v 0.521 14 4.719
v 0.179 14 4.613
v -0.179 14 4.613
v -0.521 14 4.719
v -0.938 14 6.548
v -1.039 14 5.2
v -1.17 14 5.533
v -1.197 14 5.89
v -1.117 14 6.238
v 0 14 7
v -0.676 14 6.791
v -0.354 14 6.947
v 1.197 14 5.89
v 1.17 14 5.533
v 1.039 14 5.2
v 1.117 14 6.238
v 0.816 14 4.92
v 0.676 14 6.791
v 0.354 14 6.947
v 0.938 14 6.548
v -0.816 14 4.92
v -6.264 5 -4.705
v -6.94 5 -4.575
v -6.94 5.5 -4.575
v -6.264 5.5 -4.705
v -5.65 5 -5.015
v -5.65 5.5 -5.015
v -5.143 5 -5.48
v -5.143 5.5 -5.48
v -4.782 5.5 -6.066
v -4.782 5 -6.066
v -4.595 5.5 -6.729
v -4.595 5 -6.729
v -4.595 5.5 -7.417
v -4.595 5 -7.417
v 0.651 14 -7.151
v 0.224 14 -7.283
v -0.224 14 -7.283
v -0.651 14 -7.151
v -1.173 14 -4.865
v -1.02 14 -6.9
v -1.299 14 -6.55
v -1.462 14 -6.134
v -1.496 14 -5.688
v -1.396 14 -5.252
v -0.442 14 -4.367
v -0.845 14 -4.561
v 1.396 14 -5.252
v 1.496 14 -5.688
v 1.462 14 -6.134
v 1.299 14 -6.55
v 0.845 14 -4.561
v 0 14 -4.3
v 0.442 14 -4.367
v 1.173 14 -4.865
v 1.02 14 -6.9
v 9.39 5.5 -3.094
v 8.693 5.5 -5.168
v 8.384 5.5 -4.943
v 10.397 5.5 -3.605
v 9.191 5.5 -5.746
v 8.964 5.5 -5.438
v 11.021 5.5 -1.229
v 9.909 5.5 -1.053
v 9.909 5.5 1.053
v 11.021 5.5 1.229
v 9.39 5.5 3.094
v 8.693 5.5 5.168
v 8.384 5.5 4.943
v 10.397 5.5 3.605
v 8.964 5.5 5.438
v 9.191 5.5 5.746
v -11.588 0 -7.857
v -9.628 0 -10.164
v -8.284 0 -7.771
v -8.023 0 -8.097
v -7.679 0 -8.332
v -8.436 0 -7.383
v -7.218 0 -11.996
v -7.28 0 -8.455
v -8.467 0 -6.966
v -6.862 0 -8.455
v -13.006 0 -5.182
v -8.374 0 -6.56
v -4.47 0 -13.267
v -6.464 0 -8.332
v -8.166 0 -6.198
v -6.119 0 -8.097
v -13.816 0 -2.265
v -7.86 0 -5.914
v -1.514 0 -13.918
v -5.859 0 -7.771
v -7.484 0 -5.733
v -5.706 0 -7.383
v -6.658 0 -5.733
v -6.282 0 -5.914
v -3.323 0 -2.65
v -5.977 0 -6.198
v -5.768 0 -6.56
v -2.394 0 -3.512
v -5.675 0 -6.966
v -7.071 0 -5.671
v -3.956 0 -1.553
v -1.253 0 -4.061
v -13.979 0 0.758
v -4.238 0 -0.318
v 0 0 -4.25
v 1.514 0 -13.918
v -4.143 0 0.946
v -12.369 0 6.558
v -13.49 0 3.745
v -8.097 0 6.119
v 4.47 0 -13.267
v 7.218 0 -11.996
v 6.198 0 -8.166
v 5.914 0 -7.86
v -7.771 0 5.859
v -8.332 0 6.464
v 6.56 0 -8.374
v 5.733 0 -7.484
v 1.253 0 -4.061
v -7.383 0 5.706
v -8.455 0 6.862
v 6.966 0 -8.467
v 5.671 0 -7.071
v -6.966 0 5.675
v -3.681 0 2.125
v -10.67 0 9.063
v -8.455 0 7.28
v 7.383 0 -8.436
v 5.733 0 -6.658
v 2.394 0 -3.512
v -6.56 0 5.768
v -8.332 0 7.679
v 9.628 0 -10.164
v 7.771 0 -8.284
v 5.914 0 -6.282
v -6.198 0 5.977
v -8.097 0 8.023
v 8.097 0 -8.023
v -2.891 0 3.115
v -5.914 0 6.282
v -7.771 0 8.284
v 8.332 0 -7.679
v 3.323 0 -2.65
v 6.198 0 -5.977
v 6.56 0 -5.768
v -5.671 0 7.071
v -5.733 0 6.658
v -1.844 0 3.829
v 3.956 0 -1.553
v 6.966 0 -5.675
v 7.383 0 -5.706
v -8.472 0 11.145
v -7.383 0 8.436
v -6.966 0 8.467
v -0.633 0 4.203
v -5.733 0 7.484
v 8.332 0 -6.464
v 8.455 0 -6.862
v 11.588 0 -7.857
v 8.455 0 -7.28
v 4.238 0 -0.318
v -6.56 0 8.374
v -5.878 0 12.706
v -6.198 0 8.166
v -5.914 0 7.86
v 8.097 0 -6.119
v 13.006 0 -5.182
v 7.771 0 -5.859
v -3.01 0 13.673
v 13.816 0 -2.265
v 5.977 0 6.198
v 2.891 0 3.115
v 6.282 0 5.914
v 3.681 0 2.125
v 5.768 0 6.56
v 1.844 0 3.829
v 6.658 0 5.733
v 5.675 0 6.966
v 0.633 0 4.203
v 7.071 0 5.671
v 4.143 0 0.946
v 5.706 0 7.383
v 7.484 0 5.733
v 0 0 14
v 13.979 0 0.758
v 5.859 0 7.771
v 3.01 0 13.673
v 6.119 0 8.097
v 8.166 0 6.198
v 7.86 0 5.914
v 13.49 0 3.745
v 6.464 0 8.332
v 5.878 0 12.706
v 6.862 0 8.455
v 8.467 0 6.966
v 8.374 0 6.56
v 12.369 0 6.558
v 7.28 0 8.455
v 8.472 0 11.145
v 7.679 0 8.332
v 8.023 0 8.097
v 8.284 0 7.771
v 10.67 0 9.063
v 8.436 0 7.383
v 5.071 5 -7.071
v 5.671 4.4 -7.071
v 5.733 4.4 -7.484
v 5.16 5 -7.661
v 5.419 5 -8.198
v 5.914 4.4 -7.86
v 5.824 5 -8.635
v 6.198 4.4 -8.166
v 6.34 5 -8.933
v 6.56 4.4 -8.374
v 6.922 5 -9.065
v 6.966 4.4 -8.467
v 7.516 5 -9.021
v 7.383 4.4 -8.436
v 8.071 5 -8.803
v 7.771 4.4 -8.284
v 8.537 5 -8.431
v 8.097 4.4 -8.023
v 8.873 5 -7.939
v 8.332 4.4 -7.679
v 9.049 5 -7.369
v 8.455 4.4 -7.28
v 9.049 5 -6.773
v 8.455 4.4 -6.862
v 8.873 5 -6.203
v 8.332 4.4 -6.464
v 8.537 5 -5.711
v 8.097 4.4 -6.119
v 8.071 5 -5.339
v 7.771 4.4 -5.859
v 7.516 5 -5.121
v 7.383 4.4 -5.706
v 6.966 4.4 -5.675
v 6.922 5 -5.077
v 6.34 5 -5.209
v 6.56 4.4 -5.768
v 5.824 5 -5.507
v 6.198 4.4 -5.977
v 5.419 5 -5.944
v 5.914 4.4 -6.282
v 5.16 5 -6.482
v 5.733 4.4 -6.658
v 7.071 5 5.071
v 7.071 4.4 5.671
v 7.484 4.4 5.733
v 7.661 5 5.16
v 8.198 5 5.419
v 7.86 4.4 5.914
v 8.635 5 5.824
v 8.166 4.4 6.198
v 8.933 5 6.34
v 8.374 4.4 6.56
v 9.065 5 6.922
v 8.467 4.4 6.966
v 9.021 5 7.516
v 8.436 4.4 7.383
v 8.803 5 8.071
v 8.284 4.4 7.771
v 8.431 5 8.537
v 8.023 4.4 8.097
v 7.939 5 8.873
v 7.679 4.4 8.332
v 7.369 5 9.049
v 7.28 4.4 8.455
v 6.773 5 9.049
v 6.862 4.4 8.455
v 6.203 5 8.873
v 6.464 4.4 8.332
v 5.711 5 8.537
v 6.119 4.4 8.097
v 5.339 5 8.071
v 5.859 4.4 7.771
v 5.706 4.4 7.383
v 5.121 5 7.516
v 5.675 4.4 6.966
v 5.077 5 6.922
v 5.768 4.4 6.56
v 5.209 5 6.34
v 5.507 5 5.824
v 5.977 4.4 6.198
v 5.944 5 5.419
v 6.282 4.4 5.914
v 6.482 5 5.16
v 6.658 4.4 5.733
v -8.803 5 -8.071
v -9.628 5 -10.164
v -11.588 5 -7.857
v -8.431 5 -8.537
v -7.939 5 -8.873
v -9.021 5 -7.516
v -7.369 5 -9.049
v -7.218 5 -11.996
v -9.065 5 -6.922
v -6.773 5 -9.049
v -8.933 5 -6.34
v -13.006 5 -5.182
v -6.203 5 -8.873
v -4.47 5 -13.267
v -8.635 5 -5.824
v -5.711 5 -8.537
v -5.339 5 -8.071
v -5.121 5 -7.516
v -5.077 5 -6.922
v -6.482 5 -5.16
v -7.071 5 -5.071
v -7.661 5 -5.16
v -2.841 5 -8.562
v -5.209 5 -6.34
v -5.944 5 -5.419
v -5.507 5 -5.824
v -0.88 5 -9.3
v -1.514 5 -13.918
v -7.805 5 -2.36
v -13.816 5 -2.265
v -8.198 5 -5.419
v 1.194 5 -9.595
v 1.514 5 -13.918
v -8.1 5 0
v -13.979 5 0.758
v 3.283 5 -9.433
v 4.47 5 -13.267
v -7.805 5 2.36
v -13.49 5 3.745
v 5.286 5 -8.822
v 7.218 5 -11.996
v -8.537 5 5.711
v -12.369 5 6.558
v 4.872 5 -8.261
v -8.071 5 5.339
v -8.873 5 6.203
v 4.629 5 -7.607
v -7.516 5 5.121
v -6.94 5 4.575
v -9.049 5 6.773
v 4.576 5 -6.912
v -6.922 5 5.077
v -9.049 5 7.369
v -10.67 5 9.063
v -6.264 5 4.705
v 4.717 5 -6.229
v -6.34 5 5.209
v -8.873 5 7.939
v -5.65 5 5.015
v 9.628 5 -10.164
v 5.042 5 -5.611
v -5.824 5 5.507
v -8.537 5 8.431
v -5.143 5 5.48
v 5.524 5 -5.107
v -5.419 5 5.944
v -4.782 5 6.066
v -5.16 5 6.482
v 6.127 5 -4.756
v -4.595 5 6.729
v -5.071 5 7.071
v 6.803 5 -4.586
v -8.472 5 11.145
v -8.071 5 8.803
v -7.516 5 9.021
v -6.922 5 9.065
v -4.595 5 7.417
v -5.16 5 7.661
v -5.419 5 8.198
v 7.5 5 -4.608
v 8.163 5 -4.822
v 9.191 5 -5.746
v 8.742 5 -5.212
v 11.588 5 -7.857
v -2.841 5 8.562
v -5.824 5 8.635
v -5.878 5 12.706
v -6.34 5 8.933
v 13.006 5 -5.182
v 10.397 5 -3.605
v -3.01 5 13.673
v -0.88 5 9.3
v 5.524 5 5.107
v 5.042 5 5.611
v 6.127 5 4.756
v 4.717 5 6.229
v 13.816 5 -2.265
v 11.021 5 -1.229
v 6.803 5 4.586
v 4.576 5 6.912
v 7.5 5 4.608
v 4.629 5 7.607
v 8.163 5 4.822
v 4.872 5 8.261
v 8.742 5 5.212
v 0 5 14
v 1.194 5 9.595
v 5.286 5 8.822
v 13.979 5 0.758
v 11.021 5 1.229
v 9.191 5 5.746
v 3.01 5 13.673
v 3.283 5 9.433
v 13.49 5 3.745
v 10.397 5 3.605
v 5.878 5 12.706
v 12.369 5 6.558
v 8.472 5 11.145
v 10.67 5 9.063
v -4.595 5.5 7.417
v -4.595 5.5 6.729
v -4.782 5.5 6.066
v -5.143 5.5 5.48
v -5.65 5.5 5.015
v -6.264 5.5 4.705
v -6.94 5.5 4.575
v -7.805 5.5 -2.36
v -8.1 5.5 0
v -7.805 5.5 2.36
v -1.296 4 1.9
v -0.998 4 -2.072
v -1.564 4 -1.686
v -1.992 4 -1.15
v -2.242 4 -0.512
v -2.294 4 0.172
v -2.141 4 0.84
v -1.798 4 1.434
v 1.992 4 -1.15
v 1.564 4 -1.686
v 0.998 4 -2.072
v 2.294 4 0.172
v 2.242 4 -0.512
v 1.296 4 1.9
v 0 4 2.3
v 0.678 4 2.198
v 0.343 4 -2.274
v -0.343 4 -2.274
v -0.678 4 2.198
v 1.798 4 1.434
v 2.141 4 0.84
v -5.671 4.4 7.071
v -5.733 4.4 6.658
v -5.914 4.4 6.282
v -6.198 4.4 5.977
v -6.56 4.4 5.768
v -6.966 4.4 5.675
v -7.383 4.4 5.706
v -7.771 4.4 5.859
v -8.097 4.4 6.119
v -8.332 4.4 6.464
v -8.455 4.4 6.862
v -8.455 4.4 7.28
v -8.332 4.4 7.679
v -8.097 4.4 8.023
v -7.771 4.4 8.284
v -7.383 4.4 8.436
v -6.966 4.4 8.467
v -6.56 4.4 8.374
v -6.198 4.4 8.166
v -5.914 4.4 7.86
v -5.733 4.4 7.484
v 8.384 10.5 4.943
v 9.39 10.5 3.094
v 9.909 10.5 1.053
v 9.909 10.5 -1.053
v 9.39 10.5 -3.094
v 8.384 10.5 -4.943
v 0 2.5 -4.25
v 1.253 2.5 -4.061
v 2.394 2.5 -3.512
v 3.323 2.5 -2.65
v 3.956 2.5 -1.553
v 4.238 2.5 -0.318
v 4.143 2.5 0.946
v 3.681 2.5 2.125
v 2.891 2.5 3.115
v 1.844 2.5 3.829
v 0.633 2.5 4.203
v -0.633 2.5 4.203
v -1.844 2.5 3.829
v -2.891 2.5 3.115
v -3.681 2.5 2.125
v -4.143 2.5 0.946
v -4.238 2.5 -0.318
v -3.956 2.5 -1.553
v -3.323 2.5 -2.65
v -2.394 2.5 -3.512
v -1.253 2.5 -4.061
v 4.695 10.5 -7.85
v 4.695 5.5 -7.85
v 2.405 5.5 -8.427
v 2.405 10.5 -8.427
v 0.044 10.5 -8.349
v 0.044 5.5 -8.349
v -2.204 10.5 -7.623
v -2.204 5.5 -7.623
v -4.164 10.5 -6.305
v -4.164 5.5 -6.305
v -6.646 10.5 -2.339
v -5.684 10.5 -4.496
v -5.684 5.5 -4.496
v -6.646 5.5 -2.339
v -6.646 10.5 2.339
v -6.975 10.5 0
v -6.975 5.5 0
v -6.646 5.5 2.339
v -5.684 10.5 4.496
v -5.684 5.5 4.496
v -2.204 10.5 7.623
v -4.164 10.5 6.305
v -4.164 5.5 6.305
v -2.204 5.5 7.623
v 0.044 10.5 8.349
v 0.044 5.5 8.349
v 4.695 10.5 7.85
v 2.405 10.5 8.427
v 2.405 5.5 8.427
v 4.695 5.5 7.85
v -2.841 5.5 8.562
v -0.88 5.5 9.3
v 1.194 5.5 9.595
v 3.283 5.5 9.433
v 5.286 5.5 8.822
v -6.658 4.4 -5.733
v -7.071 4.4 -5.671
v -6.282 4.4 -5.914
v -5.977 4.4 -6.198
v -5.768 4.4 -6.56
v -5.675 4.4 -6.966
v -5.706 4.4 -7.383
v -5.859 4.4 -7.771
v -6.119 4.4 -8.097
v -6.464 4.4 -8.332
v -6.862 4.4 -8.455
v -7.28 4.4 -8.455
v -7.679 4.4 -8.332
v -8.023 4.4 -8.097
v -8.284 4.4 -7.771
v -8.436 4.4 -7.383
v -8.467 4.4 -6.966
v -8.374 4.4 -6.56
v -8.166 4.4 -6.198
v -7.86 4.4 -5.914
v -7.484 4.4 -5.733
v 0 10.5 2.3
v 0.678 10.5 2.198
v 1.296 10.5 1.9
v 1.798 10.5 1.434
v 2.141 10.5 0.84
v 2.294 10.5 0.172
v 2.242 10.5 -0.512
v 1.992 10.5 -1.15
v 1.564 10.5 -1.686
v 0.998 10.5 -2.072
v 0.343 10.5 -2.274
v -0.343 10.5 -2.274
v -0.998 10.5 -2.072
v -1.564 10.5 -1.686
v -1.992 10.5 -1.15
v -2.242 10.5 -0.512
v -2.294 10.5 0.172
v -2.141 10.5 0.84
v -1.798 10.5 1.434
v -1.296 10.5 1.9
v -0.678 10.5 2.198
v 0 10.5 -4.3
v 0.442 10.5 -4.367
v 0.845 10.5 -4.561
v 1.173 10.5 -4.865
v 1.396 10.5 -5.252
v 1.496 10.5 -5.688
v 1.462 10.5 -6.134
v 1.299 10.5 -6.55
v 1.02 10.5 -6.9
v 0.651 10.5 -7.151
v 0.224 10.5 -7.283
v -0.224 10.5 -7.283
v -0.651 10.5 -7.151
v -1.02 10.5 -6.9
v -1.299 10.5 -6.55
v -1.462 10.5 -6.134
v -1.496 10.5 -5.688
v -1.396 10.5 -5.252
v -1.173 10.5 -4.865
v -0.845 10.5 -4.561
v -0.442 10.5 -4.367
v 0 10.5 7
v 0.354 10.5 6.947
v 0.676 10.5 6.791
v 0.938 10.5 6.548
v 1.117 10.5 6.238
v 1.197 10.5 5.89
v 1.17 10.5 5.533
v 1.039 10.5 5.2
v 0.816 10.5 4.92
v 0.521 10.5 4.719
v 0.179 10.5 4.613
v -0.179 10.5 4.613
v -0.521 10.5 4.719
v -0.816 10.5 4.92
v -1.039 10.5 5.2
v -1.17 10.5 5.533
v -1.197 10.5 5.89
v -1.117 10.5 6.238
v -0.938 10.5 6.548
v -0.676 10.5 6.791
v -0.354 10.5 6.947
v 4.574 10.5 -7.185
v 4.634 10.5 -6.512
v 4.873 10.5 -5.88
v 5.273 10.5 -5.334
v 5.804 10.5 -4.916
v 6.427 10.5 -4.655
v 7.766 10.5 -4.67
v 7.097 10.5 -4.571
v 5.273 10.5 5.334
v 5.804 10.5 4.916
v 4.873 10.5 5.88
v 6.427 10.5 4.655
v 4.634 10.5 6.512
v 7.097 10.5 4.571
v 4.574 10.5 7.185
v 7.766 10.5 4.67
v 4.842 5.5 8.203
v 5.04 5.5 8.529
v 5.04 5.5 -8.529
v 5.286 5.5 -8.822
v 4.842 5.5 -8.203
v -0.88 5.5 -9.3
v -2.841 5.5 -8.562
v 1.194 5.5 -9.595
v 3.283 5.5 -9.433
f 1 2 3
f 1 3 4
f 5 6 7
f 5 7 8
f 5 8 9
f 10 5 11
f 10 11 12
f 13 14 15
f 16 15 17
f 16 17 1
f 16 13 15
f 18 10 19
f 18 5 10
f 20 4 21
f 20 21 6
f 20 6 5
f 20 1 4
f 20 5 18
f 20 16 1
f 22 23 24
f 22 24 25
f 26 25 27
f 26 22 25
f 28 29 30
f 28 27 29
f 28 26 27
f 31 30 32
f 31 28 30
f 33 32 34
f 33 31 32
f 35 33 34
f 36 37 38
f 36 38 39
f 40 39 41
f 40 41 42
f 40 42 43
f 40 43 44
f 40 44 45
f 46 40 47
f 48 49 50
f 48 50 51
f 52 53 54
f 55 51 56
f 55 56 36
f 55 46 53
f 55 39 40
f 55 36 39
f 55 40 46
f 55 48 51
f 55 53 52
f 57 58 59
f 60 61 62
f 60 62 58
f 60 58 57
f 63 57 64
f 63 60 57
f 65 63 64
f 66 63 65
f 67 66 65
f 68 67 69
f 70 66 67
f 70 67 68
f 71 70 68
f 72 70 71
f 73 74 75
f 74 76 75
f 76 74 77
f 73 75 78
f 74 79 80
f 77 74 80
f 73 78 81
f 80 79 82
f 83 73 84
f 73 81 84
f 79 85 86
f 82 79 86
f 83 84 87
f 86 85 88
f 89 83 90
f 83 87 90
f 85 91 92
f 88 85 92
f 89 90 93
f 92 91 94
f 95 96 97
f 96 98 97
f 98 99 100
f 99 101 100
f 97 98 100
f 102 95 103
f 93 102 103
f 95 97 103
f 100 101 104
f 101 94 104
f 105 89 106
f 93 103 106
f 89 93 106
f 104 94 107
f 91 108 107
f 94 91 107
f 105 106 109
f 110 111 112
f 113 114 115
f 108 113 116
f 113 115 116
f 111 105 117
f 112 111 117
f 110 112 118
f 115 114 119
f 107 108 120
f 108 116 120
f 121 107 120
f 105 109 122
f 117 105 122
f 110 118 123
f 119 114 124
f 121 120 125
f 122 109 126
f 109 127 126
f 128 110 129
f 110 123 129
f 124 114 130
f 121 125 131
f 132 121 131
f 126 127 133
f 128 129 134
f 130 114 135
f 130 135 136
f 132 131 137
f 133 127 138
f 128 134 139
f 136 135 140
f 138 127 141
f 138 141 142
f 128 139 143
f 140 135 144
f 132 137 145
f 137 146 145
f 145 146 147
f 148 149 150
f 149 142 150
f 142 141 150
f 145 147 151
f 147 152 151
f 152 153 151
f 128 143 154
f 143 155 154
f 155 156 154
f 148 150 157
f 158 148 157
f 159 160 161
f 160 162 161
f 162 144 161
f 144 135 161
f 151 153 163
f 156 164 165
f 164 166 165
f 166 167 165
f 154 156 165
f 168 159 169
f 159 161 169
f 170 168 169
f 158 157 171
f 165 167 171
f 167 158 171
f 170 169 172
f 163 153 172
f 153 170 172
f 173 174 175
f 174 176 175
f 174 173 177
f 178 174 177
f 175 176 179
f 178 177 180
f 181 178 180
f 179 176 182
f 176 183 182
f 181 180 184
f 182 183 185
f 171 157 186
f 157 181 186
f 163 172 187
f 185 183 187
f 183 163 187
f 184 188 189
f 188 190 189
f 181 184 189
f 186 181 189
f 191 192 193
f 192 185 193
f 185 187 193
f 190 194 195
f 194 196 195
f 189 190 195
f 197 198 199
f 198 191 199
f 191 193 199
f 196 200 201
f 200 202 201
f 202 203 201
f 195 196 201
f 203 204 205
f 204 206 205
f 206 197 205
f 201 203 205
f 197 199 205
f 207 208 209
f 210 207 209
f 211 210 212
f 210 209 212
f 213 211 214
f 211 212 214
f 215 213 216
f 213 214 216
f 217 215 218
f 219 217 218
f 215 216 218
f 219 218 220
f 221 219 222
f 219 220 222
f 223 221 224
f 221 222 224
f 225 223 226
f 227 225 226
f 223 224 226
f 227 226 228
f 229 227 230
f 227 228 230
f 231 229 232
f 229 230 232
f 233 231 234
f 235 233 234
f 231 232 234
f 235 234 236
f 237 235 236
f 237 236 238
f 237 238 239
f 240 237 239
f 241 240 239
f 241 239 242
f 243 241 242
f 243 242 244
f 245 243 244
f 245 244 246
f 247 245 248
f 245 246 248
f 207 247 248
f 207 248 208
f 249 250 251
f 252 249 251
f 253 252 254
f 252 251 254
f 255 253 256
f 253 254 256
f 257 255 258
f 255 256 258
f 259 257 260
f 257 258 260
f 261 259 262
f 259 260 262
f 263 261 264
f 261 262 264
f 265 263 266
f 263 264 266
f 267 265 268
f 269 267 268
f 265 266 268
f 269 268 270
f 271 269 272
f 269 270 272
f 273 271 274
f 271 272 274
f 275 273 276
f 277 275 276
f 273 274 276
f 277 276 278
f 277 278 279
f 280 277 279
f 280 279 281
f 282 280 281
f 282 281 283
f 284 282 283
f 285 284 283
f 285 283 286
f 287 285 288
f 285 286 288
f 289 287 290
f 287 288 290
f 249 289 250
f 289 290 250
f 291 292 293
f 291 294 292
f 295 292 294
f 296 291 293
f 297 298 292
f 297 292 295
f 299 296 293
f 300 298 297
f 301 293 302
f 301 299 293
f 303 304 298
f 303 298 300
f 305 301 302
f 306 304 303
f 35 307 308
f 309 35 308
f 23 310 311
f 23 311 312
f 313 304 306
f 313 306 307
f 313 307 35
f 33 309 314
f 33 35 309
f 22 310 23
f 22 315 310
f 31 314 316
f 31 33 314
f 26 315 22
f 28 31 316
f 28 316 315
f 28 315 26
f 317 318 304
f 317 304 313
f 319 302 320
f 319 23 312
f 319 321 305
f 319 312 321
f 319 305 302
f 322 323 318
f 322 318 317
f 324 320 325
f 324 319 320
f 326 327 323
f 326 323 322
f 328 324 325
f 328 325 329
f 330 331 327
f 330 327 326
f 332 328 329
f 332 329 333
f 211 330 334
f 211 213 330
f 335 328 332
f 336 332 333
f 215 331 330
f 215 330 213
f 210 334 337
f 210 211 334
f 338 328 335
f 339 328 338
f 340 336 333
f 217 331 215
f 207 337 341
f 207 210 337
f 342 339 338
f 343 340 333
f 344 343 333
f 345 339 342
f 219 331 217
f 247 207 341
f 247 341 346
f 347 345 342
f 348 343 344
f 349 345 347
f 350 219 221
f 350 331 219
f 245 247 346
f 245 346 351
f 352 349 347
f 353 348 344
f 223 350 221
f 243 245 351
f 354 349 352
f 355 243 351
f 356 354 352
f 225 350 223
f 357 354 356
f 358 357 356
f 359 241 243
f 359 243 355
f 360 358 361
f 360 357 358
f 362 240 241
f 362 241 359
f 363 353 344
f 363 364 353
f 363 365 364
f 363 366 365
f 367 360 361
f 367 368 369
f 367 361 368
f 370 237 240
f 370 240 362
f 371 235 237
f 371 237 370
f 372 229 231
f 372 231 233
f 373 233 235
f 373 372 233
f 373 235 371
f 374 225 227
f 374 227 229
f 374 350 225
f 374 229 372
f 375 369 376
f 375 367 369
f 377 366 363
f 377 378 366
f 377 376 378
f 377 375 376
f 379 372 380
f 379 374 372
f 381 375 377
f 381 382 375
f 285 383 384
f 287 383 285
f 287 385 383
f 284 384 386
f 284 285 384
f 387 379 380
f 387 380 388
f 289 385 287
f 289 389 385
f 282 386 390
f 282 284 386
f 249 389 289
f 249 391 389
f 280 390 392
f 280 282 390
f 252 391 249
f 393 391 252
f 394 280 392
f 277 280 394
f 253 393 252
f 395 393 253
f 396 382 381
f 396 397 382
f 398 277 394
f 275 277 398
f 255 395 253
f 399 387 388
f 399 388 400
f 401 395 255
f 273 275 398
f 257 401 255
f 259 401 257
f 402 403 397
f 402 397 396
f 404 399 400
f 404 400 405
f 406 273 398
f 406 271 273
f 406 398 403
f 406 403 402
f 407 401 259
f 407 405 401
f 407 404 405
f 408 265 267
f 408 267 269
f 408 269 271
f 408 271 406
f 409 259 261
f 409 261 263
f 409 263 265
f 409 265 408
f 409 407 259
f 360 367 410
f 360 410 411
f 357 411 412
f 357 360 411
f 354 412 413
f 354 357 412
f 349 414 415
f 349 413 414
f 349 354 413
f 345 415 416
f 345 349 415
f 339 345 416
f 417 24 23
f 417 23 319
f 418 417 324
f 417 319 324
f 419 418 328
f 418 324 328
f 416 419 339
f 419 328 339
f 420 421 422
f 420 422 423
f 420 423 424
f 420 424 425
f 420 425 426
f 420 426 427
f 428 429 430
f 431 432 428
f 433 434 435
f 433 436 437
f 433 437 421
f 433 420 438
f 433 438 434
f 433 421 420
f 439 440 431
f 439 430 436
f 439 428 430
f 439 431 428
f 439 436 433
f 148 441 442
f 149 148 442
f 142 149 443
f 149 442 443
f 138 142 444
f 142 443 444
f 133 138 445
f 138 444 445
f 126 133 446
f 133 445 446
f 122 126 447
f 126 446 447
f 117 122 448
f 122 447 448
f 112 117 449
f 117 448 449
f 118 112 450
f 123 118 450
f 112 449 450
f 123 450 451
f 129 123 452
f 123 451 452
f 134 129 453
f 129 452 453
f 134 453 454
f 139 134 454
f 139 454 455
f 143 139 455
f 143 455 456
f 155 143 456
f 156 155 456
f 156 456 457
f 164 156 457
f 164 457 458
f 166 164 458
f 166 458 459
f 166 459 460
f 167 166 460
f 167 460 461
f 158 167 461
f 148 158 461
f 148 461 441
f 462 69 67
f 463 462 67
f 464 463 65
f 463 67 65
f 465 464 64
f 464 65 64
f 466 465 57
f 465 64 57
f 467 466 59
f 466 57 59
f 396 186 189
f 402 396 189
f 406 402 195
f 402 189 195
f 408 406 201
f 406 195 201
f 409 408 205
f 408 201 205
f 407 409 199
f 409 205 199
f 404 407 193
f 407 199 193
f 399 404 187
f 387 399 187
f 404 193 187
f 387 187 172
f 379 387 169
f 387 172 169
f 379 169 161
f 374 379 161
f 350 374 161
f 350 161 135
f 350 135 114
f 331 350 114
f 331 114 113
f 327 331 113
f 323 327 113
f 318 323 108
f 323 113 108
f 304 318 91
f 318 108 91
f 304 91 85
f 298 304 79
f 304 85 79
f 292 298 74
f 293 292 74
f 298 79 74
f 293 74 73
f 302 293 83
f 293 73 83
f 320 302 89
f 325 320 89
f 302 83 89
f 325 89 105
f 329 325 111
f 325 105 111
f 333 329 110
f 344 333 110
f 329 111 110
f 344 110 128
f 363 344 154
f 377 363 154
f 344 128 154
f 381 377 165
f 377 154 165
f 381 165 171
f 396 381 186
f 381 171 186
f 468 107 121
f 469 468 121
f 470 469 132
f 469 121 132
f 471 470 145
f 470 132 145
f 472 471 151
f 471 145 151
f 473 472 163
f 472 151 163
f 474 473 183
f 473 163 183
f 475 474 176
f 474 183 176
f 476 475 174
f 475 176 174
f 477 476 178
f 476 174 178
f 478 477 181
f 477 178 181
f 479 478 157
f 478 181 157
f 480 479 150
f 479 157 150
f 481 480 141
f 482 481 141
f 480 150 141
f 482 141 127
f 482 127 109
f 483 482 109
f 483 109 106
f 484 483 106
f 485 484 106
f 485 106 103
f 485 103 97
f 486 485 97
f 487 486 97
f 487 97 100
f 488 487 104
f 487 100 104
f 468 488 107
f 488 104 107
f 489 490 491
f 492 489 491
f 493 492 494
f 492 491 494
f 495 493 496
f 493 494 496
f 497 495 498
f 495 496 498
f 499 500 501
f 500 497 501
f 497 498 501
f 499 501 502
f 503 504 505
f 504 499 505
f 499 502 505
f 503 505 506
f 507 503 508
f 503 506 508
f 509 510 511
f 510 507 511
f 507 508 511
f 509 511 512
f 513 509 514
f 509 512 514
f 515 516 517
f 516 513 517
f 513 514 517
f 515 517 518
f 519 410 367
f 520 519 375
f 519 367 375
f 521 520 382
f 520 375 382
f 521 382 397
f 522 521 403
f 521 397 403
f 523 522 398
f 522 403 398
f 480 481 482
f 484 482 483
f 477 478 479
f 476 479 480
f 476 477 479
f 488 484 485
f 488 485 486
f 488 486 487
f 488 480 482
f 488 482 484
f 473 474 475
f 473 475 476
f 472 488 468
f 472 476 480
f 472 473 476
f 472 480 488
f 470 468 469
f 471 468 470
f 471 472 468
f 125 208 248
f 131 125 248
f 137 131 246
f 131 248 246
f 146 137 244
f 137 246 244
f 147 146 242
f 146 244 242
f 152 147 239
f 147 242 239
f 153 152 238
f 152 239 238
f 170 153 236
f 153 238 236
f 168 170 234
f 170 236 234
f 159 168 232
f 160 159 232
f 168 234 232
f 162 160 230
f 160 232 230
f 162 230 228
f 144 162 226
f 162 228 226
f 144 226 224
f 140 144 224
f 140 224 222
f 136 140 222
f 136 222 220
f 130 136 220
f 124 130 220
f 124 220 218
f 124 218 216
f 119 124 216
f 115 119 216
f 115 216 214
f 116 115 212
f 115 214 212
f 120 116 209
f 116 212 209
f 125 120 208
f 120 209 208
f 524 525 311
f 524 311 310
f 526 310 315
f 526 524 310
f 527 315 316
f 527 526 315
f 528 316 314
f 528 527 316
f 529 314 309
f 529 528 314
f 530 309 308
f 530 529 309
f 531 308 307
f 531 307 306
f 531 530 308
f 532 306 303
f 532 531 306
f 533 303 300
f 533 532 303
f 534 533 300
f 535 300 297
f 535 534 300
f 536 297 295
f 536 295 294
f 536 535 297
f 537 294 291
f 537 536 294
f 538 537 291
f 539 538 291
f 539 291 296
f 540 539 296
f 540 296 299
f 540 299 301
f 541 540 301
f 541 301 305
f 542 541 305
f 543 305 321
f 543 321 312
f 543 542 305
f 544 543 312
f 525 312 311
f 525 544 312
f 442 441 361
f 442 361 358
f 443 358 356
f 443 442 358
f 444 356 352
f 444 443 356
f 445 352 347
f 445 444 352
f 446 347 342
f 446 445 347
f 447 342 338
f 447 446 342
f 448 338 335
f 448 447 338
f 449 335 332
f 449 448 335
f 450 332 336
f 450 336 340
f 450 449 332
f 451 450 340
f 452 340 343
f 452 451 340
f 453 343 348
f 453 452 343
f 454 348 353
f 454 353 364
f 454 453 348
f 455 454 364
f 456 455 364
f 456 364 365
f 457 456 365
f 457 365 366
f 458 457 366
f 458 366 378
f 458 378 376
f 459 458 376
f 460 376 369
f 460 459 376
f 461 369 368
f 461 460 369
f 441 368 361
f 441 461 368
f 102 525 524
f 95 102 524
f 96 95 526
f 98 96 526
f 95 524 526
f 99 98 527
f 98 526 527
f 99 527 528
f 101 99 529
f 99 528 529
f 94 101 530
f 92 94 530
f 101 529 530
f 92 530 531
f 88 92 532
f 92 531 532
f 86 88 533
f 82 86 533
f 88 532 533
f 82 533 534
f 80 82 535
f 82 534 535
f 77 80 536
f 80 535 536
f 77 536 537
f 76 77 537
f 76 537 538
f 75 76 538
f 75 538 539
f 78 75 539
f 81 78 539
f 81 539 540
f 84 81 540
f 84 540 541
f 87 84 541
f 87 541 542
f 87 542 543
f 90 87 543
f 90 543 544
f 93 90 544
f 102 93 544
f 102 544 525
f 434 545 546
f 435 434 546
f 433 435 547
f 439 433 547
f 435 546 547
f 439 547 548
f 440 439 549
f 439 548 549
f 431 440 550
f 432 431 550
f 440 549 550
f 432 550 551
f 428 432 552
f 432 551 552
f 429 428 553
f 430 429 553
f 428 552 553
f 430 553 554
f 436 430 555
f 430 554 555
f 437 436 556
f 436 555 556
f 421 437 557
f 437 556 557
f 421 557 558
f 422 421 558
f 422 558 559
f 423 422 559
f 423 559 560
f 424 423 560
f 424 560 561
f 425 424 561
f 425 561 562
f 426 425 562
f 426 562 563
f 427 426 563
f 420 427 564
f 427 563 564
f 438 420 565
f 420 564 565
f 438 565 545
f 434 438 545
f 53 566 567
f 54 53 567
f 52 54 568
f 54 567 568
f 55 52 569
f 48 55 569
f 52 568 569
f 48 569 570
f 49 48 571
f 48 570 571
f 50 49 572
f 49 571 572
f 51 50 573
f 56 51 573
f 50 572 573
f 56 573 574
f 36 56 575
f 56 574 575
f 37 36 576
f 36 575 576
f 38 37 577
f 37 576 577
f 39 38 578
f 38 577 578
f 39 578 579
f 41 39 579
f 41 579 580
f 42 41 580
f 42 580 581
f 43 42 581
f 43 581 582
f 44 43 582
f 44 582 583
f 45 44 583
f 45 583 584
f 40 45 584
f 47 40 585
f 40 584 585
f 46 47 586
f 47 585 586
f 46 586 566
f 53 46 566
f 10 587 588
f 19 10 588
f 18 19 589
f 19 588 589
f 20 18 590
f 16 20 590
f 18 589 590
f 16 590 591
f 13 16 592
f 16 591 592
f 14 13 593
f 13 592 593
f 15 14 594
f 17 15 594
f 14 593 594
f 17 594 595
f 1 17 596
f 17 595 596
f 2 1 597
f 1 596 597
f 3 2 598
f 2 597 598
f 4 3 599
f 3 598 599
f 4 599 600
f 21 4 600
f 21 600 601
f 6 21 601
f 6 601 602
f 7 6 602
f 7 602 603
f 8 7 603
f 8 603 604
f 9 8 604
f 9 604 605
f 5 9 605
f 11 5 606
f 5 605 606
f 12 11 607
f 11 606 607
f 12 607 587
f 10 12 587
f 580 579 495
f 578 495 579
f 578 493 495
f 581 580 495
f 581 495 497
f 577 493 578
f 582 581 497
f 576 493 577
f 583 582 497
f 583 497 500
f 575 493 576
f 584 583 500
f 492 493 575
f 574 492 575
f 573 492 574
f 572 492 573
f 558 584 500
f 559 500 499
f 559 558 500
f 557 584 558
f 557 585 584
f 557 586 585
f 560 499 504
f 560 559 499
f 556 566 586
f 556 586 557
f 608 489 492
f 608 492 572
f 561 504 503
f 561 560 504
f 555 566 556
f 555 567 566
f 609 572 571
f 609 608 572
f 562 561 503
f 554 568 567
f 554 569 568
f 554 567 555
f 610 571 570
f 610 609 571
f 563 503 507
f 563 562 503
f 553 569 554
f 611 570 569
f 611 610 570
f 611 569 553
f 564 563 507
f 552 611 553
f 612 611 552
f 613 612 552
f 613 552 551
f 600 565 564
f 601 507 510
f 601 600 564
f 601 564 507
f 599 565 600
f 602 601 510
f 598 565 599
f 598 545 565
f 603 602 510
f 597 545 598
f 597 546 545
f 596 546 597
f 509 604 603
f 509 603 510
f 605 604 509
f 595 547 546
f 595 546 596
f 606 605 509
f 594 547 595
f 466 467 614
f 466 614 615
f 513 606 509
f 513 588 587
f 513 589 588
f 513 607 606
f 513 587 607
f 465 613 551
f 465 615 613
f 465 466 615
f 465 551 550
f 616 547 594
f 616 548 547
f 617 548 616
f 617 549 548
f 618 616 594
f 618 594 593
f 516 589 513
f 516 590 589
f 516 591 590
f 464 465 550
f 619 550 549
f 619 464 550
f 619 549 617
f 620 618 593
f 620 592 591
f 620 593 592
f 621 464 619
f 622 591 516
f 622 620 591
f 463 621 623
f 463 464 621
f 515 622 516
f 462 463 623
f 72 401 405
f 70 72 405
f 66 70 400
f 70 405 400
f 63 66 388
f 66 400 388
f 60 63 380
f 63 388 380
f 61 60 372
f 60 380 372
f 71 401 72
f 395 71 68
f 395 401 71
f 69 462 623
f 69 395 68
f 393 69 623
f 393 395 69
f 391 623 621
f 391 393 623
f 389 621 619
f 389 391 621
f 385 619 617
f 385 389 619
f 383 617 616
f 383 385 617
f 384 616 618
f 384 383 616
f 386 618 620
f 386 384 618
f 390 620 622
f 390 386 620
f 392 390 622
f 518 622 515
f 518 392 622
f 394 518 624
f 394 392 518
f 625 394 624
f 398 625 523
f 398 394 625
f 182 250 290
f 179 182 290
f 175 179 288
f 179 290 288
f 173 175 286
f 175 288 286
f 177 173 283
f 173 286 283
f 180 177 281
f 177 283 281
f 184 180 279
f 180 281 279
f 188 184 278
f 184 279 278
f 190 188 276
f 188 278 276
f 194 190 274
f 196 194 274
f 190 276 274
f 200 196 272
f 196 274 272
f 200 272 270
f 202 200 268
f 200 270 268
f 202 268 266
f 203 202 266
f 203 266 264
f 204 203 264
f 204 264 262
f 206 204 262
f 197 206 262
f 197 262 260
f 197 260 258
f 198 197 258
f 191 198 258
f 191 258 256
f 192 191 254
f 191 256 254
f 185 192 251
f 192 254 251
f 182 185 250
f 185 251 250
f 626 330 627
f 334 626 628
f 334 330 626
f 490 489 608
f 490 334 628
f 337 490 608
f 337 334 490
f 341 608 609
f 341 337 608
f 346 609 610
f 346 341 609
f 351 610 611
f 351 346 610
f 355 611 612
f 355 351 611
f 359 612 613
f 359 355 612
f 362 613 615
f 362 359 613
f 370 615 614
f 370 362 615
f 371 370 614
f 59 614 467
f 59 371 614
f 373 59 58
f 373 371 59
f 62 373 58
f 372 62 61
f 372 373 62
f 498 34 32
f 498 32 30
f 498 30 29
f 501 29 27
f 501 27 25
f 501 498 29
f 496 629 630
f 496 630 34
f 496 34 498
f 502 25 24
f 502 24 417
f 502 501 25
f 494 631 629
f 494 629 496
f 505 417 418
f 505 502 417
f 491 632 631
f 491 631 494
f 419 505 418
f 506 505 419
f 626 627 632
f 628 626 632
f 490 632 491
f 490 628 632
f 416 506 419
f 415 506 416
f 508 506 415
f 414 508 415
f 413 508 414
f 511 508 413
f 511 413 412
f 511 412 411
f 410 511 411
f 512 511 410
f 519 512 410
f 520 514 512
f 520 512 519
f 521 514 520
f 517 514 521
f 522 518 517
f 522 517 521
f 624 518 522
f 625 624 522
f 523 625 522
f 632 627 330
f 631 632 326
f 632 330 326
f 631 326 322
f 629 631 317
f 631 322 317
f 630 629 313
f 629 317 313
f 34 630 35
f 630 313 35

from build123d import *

# Parameters (mm, degrees)
SKETCH1_R           = 14
BOSS_EXTRUDE1_DEPTH = 5
SKETCH2_R           = 9.6
BOSS_EXTRUDE2_DEPTH = 0.5
SKETCH3_R           = 8.475
BOSS_EXTRUDE3_DEPTH = 5
SKETCH4_R           = 1.4
CUT_EXTRUDE1_DEPTH  = 21.548722588
CIRPATTERN1_COUNT   = 4
SKETCH5_R           = 2.5
CUT_EXTRUDE2_DEPTH  = 21.548722588
CHAMFER1_SIZE       = 0.6
SKETCH6_R           = 4.25
CUT_EXTRUDE3_DEPTH  = 2.5
SKETCH7_R           = 2.3
CUT_EXTRUDE4_DEPTH  = 6.5
SKETCH8_R           = 1.5
SKETCH8_R_2         = 1.2
BOSS_EXTRUDE4_DEPTH = 3.5


with BuildPart() as part:
    # Sketch1 → Boss-Extrude1 (new body)
    with BuildSketch(Plane(origin=(0, 0, 0), x_dir=(1, 0, 0), z_dir=(0, 1, 0))):
        with Locations(Location((0, 0, 0), (0, 0, 270))):
            Circle(SKETCH1_R)
    extrude(amount=BOSS_EXTRUDE1_DEPTH)

    # Sketch2 → Boss-Extrude2 (add)
    with BuildSketch(Plane(origin=(0, 5, 0), x_dir=(1, 0, 0), z_dir=(0, 1, 0))):
        with Locations(Location((1.5, 0, 0), (0, 0, 270))):
            Circle(SKETCH2_R)
    extrude(amount=BOSS_EXTRUDE2_DEPTH)

    # Sketch3 → Boss-Extrude3 (add)
    with BuildSketch(Plane(origin=(0, 5.5, 0), x_dir=(1, 0, 0), z_dir=(0, 1, 0))):
        with Locations(Location((1.5, 0, 0), (0, 0, 270))):
            Circle(SKETCH3_R)
    extrude(amount=BOSS_EXTRUDE3_DEPTH)

    # Sketch4 → Cut-Extrude1 (cut, through all)
    with BuildSketch(Plane(origin=(0, 5, 0), x_dir=(1, 0, 0), z_dir=(0, 1, 0))):
        with Locations(Location((-7.071067812, 7.071067812, 0), (0, 0, 270))):
            Circle(SKETCH4_R)
    cut_extrude1 = extrude(amount=-CUT_EXTRUDE1_DEPTH, mode=Mode.SUBTRACT)

    # CirPattern1: Cut-Extrude1 ×4 about axis
    cirpattern1_axis = Axis((0, 0, 0), (0, 1, 0))
    for i in range(1, CIRPATTERN1_COUNT):
        add(cut_extrude1.rotate(cirpattern1_axis, i * 360 / CIRPATTERN1_COUNT), mode=Mode.SUBTRACT)

    # Sketch5 → Cut-Extrude2 (cut, through all)
    with BuildSketch(Plane(origin=(0, 5, 0), x_dir=(1, 0, 0), z_dir=(0, 1, 0))):
        with Locations((-7.071067812, 7.071067812)):
            Circle(SKETCH5_R)
        with Locations((7.071067812, 7.071067812)):
            Circle(SKETCH5_R)
        with Locations((7.071067812, -7.071067812)):
            Circle(SKETCH5_R)
        with Locations((-7.071067812, -7.071067812)):
            Circle(SKETCH5_R)
    extrude(amount=CUT_EXTRUDE2_DEPTH, mode=Mode.SUBTRACT)

    # Chamfer1
    chamfer1_edges = [part.edges().sort_by_distance(p)[0] for p in [
        (-7.071067812, 5, -8.471067812),
        (8.471067812, 5, -7.071067812),
        (7.071067812, 5, 8.471067812),
        (-8.471067812, 5, 7.071067812),
    ]]
    chamfer(chamfer1_edges, length=CHAMFER1_SIZE)

    # Sketch6 → Cut-Extrude3 (cut)
    with BuildSketch(Plane.XZ):
        with Locations(Location((0, 0, 0), (0, 0, 270))):
            Circle(SKETCH6_R)
    extrude(amount=-CUT_EXTRUDE3_DEPTH, mode=Mode.SUBTRACT)

    # Sketch7 → Cut-Extrude4 (cut)
    with BuildSketch(Plane(origin=(0, 10.5, 0), x_dir=(1, 0, 0), z_dir=(0, 1, 0))):
        with Locations(Location((0, 0, 0), (0, 0, 270))):
            Circle(SKETCH7_R)
    extrude(amount=-CUT_EXTRUDE4_DEPTH, mode=Mode.SUBTRACT)

    # Sketch8 → Boss-Extrude4 (add)
    with BuildSketch(Plane(origin=(0, 10.5, 0), x_dir=(1, 0, 0), z_dir=(0, 1, 0))):
        with Locations(Location((0, 5.8, 0), (0, 0, 270))):
            Circle(SKETCH8_R)
        with Locations(Location((0, -5.8, 0), (0, 0, 270))):
            Circle(SKETCH8_R_2)
    extrude(amount=BOSS_EXTRUDE4_DEPTH)


solid = part.part
